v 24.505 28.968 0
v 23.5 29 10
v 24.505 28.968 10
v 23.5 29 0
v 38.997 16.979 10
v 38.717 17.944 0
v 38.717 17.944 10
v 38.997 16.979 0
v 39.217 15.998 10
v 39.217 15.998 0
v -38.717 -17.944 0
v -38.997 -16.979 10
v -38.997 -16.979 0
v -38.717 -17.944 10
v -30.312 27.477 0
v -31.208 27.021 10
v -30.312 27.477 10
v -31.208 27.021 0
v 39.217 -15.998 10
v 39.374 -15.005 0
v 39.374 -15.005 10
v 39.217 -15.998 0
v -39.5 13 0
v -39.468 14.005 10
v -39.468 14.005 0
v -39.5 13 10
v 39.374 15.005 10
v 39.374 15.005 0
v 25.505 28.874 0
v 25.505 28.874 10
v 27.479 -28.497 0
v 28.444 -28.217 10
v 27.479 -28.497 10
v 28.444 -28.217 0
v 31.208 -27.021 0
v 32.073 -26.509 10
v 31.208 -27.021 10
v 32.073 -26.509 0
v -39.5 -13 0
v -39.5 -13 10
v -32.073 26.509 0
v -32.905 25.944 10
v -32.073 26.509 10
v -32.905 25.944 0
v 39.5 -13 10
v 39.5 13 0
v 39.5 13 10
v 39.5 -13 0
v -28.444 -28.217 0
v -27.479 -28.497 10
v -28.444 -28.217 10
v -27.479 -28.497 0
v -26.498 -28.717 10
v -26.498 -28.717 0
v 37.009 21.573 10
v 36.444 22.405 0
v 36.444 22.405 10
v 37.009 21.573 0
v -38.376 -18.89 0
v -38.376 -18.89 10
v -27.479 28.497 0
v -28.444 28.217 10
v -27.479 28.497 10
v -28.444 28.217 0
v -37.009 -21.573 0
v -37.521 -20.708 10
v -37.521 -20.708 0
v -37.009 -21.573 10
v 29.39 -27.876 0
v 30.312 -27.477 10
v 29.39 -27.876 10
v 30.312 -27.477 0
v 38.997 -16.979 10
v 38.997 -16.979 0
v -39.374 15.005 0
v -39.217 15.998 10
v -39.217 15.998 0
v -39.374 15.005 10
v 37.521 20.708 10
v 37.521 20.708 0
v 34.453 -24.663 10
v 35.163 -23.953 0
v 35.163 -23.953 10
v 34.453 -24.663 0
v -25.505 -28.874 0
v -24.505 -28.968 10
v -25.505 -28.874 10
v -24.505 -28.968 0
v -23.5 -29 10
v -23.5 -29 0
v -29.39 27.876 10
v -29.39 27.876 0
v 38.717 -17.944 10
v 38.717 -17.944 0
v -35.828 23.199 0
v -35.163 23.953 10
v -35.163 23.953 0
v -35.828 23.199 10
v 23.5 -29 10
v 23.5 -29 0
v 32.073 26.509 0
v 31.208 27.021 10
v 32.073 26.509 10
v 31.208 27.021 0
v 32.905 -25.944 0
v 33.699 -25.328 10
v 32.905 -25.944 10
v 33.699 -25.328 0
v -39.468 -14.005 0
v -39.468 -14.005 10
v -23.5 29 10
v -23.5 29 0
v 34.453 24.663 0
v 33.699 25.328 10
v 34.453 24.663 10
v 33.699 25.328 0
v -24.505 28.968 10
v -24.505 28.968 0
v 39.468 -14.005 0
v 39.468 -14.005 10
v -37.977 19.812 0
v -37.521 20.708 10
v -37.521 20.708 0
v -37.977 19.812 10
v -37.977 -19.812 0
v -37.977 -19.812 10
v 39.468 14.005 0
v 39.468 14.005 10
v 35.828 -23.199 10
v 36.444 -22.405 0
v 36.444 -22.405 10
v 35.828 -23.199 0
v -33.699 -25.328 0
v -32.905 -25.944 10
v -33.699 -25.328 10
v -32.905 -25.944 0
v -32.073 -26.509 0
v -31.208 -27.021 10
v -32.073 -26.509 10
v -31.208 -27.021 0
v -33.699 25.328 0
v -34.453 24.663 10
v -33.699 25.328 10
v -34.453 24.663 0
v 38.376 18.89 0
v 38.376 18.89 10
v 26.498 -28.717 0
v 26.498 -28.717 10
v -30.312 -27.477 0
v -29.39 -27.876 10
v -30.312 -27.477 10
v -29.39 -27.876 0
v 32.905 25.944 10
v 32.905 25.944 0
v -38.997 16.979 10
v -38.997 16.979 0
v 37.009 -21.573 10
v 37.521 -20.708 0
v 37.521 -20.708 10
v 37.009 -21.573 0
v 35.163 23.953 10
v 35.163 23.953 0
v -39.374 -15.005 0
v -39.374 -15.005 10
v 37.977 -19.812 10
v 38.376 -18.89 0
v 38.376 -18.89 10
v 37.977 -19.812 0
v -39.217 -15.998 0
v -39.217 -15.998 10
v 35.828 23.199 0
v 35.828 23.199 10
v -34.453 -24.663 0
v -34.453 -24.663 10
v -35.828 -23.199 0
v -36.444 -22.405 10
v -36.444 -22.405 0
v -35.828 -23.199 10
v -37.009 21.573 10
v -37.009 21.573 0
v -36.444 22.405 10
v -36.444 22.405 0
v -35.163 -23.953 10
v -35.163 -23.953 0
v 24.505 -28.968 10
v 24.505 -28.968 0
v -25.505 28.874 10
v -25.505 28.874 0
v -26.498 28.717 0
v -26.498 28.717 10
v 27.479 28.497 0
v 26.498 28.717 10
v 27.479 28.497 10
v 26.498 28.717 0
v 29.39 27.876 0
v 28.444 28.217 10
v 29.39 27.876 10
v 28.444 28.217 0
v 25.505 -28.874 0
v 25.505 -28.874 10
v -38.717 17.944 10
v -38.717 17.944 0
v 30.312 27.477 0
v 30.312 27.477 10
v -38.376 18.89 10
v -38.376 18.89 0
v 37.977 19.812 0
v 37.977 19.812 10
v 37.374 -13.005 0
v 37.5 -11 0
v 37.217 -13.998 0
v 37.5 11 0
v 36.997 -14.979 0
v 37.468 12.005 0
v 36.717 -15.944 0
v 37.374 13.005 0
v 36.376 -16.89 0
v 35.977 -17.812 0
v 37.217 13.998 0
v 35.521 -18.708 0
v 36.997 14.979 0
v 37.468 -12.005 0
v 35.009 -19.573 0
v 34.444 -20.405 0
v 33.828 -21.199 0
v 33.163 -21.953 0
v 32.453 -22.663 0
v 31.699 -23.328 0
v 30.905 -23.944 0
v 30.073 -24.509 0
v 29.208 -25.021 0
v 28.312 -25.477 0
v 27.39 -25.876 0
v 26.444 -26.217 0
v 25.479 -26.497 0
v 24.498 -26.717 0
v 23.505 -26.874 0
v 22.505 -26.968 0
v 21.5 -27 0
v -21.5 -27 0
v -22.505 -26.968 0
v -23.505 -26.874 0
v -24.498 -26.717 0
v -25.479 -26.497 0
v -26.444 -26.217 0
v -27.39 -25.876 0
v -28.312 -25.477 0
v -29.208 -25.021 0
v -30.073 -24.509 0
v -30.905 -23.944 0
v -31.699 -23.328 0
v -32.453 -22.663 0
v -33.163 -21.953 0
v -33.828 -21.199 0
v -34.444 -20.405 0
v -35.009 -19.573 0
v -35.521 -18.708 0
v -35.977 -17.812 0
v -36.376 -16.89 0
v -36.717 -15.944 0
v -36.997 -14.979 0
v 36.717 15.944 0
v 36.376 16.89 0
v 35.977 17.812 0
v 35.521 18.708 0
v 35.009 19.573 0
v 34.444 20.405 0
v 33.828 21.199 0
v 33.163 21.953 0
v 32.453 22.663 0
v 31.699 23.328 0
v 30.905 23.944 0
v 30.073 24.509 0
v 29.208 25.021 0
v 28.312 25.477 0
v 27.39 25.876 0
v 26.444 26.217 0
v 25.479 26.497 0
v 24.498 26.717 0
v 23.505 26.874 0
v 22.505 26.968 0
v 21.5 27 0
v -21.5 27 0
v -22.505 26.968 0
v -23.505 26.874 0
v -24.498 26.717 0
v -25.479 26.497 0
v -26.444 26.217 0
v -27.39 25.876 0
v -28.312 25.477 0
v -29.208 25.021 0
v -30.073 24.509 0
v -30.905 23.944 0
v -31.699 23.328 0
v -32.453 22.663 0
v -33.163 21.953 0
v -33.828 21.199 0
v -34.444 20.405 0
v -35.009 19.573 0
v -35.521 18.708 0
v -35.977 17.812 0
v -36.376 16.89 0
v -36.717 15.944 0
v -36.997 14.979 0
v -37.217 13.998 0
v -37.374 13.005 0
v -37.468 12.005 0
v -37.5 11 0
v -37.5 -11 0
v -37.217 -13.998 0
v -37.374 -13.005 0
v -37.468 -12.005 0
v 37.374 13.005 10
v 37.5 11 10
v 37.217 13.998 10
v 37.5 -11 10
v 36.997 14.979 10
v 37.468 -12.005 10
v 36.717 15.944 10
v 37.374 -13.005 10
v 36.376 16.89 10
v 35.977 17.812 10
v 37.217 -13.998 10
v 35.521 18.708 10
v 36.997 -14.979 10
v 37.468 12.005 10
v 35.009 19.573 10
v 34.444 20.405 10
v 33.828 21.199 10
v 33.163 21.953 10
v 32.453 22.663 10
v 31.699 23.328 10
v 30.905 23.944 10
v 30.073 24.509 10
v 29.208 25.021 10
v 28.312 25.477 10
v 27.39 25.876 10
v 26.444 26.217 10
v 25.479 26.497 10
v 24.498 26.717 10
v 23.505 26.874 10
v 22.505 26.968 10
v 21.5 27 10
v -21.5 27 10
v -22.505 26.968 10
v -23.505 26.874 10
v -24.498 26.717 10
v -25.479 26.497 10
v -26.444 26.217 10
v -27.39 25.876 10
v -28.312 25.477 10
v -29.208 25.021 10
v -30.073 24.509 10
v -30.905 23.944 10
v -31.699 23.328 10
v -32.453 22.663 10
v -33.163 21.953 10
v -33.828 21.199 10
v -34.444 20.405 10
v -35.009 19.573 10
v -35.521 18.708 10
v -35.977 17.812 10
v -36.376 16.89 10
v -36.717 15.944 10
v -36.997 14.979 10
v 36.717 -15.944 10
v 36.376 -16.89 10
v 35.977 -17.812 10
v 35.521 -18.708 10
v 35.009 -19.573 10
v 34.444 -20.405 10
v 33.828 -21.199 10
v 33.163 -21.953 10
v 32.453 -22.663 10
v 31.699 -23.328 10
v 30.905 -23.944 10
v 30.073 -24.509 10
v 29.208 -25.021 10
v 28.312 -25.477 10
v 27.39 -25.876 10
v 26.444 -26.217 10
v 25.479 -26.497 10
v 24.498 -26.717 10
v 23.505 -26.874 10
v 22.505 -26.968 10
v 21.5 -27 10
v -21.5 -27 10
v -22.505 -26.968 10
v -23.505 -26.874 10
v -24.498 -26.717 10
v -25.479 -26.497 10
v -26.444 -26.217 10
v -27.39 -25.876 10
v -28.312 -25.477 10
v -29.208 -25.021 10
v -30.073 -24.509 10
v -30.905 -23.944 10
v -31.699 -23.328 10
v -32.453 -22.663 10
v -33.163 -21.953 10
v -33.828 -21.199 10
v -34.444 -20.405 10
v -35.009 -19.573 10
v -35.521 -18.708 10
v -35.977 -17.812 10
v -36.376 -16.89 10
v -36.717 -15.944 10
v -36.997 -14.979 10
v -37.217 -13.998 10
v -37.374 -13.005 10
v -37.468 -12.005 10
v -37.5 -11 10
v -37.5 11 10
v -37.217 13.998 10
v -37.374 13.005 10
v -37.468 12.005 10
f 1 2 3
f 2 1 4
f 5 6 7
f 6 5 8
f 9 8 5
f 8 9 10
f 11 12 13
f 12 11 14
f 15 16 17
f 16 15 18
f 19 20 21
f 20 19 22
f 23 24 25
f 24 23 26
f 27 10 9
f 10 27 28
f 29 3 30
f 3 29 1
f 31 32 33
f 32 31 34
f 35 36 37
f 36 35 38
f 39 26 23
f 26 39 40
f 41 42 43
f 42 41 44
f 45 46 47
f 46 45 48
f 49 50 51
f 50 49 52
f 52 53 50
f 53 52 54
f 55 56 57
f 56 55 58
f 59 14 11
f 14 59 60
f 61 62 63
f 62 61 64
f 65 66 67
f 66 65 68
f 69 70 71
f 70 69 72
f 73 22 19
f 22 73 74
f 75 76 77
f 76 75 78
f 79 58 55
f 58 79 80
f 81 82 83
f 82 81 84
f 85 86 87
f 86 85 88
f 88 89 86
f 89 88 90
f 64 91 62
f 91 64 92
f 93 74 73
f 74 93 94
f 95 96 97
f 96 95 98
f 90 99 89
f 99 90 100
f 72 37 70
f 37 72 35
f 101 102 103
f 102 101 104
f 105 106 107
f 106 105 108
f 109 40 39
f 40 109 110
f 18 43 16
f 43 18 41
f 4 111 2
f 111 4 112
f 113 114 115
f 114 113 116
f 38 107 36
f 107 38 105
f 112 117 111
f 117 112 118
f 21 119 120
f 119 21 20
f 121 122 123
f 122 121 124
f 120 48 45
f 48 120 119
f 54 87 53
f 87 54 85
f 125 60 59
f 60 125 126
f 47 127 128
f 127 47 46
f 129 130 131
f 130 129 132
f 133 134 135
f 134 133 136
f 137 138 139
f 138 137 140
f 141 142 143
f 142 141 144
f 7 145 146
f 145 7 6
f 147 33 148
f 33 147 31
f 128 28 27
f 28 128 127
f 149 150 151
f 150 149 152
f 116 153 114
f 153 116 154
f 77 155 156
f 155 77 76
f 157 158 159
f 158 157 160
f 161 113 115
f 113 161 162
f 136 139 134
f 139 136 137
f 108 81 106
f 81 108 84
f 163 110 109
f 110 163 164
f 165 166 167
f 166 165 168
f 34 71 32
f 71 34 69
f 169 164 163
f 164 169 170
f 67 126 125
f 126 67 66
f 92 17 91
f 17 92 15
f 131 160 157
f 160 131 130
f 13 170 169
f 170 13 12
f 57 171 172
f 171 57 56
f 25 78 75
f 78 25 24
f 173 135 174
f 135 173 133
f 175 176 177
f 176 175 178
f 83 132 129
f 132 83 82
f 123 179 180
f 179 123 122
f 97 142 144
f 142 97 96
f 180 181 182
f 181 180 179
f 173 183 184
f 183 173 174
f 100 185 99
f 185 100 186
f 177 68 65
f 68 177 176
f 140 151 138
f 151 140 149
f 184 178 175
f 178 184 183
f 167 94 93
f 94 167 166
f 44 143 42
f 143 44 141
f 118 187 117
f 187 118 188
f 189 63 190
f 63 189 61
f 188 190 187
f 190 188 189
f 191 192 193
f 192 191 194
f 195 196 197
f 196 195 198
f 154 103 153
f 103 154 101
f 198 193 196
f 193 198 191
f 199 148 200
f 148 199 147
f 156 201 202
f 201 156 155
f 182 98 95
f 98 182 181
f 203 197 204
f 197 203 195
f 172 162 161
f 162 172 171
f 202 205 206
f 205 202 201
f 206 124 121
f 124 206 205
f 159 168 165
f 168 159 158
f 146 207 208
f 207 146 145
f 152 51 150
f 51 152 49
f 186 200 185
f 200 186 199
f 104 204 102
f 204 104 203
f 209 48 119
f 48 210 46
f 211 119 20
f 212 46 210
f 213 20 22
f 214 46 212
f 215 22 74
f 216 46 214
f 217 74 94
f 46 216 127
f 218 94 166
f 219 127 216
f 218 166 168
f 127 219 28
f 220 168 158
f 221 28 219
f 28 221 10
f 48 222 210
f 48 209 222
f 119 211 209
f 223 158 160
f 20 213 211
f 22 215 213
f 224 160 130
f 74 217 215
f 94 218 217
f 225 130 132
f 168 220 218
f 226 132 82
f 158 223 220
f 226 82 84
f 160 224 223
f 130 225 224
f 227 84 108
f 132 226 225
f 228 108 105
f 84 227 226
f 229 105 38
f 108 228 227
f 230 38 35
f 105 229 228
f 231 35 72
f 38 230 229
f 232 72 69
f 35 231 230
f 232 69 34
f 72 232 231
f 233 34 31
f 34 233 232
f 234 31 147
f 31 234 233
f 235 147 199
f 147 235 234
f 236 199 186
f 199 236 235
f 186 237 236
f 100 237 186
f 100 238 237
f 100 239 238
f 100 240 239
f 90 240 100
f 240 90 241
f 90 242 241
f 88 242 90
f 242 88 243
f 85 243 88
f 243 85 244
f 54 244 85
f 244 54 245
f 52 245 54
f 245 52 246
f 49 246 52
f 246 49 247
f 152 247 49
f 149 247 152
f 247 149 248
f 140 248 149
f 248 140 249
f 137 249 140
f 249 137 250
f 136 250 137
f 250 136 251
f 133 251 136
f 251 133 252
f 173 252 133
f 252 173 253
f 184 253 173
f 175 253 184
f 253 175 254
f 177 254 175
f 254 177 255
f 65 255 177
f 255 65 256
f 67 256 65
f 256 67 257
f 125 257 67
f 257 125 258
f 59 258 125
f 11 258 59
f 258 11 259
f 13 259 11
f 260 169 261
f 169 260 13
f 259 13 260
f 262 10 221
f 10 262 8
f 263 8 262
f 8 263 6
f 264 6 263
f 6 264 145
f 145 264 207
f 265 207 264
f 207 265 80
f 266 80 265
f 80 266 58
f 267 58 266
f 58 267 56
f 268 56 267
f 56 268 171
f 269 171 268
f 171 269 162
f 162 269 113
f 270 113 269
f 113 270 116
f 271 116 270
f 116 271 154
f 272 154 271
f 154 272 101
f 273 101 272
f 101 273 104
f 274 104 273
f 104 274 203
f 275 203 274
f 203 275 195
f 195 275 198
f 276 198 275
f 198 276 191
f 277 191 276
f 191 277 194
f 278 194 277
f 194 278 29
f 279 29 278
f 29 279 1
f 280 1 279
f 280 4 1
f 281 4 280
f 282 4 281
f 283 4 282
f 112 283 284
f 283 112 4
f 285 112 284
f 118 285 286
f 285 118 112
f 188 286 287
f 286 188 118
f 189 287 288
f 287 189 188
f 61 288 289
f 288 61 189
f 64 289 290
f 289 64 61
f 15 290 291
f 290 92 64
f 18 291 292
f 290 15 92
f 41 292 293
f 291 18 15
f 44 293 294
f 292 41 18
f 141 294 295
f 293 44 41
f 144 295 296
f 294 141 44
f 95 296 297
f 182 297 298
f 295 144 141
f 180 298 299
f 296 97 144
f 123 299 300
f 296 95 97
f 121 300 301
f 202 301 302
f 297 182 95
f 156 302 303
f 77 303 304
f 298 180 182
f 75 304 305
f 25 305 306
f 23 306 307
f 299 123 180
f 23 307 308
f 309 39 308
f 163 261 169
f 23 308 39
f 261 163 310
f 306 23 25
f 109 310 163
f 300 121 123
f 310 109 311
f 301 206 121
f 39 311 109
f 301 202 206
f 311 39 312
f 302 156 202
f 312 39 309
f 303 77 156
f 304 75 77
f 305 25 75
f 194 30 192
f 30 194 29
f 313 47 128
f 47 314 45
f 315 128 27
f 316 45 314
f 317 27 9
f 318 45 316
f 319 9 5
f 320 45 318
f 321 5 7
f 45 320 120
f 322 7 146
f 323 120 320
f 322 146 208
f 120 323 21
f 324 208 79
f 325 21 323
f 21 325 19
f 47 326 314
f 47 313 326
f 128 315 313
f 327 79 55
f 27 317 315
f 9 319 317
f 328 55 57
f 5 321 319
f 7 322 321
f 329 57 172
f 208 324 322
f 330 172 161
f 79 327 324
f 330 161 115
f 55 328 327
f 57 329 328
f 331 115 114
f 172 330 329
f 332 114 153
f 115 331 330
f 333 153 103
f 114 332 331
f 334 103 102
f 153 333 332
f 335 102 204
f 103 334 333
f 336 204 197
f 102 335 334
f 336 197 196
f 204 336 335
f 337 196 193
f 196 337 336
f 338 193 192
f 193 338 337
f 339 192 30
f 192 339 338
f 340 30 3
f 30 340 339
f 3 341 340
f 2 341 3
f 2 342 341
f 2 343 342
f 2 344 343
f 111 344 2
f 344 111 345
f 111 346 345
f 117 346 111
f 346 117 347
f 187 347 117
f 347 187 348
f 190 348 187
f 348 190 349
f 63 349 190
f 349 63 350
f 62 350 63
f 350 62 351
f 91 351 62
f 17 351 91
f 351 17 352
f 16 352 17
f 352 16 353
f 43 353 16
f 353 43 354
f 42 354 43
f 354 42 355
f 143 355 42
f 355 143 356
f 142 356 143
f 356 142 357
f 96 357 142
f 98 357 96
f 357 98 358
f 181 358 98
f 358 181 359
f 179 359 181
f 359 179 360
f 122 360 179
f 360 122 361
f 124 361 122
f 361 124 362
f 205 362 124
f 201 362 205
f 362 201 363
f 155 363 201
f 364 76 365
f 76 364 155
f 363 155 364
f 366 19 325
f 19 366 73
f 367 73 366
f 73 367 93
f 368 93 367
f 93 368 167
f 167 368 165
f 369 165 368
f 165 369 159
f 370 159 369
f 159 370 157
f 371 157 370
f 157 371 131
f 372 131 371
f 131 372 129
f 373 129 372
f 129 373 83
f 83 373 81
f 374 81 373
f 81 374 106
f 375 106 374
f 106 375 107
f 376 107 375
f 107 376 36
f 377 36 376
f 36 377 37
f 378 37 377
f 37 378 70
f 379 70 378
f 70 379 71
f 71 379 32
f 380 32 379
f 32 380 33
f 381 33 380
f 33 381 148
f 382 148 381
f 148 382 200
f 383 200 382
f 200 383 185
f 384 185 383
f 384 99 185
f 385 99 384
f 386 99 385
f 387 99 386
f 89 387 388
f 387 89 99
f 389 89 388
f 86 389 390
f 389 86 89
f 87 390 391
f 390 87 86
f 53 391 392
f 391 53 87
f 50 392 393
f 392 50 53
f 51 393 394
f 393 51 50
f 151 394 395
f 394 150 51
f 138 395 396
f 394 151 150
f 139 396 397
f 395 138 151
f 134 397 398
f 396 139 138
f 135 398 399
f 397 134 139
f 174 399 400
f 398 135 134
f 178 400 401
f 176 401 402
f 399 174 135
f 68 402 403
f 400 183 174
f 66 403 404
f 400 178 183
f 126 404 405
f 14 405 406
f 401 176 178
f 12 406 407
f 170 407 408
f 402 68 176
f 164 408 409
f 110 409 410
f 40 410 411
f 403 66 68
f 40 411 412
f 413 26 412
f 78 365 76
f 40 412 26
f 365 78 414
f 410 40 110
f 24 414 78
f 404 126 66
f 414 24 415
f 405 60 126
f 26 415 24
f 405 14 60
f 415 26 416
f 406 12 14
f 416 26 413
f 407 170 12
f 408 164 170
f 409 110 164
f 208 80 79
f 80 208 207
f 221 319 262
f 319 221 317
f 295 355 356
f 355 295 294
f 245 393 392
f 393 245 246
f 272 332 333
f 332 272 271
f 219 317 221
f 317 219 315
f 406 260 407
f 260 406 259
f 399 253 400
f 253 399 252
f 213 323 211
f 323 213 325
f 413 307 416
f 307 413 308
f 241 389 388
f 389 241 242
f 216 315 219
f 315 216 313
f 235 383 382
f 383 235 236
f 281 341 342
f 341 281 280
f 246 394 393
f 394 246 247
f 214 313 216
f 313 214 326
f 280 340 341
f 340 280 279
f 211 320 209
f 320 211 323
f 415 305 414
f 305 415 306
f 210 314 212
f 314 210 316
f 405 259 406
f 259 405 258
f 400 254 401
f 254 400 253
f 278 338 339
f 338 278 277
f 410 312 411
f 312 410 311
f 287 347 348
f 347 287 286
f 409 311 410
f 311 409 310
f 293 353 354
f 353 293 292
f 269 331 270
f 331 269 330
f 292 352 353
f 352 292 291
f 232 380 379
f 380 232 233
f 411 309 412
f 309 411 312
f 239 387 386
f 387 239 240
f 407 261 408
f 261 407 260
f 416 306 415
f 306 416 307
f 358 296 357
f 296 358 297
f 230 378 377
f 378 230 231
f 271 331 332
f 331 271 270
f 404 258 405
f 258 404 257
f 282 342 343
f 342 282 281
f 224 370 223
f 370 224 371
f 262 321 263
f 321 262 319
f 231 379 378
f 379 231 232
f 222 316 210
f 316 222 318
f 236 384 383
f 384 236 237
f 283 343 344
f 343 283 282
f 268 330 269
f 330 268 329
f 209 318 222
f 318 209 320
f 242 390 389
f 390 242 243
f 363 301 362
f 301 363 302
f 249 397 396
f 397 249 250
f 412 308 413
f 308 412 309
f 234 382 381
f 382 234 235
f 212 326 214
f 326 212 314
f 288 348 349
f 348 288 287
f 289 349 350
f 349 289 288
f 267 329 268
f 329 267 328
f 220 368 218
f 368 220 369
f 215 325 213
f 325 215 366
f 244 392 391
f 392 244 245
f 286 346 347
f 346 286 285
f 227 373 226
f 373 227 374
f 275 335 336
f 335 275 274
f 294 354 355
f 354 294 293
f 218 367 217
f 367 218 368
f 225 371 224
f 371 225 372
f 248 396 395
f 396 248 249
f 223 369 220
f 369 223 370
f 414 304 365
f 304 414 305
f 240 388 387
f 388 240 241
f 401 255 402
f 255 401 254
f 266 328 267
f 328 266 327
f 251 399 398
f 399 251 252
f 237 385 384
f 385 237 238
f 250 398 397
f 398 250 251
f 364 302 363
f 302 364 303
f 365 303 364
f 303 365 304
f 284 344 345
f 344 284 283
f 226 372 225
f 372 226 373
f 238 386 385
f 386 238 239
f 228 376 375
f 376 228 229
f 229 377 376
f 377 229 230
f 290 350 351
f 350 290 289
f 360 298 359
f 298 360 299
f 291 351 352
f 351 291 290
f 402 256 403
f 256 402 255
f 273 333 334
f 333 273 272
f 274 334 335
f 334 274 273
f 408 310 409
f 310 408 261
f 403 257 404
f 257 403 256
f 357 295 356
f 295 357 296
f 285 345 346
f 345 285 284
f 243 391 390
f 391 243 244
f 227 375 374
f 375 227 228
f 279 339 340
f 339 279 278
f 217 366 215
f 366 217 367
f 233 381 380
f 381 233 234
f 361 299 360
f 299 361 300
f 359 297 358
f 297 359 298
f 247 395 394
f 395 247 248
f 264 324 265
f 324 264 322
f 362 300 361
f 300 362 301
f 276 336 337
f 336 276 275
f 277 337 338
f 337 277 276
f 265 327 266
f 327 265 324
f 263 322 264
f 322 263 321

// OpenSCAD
//$fs = 0.01;
//$fa = 0.01;
$fn = 100;
minkowski_circle = 16;
wallThickness = 4;

//outerwidth1 = 78;
//outerheight1 = 58;
//height1 = 110;
//wallThickness1 = wallThickness;

outerwidth2 = 79 - minkowski_circle;
outerheight2 = 58 - minkowski_circle;
height2 = 100;
wallThickness2 = wallThickness;



squareTube(outerwidth2,outerheight2,wallThickness2,10);

module squareTube(outerwidth, outerheight, wallThickness, height)
{
        //linear_extrude(height,true)
    difference()
    {
        linear_extrude(height,true)
        minkowski()
        {
        square([outerwidth-minkowski_circle, outerheight-minkowski_circle],true);
            circle(minkowski_circle);
        }
        
        #translate([0,0,-2])
        linear_extrude(height+4,true)
        minkowski()
        {
        square([outerwidth-wallThickness-minkowski_circle,outerheight-wallThickness-minkowski_circle],true);
                        circle(minkowski_circle);
        }
    }
}

module solidTube(outerwidth, outerheight, wallThickness, height)
{
    linear_extrude(height,true)
    minkowski()
    {
        square([outerwidth-minkowski_circle, outerheight-minkowski_circle],true);
        circle(minkowski_circle);
    }
}
